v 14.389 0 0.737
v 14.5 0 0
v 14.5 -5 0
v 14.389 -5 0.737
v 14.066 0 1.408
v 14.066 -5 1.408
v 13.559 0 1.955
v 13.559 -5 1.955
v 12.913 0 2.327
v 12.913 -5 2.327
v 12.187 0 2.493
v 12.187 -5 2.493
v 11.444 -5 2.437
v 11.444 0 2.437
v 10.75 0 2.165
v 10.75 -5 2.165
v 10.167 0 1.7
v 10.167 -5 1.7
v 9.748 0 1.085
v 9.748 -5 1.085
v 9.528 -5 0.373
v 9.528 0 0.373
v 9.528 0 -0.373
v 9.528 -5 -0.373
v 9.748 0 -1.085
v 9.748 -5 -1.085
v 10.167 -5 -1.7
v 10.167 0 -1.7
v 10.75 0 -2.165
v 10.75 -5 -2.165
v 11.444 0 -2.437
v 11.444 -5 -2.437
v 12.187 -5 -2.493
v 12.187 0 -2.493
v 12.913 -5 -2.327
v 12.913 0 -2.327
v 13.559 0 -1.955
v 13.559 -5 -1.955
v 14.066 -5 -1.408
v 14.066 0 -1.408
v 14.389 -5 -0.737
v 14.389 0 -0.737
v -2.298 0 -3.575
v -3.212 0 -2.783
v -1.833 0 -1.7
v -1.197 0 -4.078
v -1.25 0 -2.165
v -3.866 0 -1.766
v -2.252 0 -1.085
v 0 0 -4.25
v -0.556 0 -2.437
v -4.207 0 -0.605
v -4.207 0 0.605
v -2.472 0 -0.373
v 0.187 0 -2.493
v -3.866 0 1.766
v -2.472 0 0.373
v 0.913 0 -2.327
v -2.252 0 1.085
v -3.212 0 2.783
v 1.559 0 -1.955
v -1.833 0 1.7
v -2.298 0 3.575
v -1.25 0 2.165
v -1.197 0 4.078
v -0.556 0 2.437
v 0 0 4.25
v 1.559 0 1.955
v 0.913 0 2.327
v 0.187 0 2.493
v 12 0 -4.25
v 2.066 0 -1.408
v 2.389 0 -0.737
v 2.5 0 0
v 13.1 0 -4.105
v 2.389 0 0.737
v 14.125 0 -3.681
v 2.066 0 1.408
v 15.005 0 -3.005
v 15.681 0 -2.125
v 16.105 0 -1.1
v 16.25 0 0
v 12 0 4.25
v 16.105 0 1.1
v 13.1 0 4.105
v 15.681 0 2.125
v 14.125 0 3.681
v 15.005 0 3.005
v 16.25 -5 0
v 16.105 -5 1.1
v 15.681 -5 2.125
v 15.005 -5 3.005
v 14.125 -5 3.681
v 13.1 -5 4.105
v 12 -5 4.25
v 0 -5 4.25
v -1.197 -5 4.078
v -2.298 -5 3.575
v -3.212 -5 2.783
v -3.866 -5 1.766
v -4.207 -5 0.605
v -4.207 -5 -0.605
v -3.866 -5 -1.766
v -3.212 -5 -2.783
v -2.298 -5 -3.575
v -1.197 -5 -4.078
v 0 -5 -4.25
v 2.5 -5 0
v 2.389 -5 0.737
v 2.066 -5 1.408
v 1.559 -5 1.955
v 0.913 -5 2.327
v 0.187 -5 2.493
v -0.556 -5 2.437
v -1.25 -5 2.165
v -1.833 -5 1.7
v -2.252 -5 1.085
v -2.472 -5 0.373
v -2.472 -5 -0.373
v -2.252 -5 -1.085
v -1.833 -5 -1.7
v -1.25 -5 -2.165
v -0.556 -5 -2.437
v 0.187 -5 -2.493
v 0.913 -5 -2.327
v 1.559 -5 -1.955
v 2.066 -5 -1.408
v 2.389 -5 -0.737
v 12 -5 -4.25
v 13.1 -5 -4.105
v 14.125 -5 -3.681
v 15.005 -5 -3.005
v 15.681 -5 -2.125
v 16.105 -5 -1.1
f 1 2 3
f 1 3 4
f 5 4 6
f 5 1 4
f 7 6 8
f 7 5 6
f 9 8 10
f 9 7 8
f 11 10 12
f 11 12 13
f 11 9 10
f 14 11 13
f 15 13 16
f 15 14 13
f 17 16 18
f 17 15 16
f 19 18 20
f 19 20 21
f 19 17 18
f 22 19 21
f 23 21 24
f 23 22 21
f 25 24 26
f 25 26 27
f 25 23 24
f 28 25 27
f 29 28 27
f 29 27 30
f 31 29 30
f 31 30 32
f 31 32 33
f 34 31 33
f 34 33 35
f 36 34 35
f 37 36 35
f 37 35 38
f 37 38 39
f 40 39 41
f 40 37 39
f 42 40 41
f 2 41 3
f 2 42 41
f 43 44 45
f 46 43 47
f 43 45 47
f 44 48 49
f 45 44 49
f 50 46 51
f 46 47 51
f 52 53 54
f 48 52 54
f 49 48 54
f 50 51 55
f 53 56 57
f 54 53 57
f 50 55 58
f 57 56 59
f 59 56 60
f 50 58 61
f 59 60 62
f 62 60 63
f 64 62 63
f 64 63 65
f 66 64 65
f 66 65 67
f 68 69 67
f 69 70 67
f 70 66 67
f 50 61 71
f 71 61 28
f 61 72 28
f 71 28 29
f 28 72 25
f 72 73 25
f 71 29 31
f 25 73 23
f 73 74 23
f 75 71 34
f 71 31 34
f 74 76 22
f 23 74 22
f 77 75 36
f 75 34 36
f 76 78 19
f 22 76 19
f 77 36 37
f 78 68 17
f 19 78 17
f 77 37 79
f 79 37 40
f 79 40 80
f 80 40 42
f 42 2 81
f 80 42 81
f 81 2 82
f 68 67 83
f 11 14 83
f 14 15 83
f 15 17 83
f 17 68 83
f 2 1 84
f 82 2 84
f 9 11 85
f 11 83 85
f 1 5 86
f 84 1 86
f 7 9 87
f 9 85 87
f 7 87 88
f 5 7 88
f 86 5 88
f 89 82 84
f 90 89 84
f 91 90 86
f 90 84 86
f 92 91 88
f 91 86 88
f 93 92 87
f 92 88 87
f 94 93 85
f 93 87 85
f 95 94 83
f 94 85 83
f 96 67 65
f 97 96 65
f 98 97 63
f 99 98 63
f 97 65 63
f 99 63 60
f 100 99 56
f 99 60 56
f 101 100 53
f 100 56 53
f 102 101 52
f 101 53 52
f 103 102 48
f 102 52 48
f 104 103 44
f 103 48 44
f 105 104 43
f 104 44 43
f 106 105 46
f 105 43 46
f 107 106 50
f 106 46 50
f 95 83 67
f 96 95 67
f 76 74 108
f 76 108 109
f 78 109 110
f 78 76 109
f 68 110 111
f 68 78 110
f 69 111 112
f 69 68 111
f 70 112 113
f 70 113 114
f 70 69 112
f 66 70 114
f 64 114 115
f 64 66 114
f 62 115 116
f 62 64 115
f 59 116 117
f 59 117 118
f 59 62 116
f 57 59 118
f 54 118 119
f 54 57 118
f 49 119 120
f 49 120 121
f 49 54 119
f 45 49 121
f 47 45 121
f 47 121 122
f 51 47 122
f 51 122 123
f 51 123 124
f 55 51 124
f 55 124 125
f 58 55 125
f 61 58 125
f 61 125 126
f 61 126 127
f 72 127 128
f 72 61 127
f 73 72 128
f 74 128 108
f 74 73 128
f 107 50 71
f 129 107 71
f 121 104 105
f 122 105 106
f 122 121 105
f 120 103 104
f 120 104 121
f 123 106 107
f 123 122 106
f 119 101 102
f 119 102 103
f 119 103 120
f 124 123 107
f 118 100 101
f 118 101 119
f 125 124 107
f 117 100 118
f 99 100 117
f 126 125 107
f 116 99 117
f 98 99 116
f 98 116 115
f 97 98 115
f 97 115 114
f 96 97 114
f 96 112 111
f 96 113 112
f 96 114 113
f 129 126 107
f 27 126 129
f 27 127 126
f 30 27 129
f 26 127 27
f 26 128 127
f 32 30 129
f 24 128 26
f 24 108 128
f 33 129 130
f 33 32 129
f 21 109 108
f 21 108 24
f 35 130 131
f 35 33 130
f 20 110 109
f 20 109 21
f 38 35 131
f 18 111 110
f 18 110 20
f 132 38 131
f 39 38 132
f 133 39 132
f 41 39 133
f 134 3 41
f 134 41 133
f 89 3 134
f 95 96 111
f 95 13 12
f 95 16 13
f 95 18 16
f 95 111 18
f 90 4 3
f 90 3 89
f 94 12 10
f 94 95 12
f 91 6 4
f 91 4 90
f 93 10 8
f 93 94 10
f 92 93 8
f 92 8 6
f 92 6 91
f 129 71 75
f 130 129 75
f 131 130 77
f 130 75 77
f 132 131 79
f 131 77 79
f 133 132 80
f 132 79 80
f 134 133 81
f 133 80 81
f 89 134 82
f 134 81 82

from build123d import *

# Parameters (mm, degrees)
F0_R     = 2.5
F1_DEPTH = 5


with BuildPart() as f1:
    # F0 (on Front) → F1 (new body)
    with BuildSketch(Plane.XZ):
        with BuildLine():
            ThreePointArc((0, -4.25), (3.005204, -3.005204), (4.25, 0))
            ThreePointArc((4.25, 0), (3.005204, 3.005204), (0, 4.25))
            ThreePointArc((0, 4.25), (-4.25, 0), (0, -4.25))
        make_face()
        Circle(F0_R, mode=Mode.SUBTRACT)
        with BuildLine():
            ThreePointArc((16.25, 0), (15.005204, 3.005204), (12, 4.25))
            ThreePointArc((12, 4.25), (7.75, 0), (12, -4.25))
            ThreePointArc((12, -4.25), (15.005204, -3.005204), (16.25, 0))
        make_face()
        with Locations((12, 0)):
            Circle(F0_R, mode=Mode.SUBTRACT)
        with BuildLine():
            ThreePointArc((0, 4.25), (3.005204, 3.005204), (4.25, 0))
            ThreePointArc((4.25, 0), (3.005204, -3.005204), (0, -4.25))
            Line((0, -4.25), (12, -4.25))
            ThreePointArc((12, -4.25), (7.75, 0), (12, 4.25))
            Line((12, 4.25), (0, 4.25))
        make_face()
    extrude(amount=F1_DEPTH)


solid = f1.part
